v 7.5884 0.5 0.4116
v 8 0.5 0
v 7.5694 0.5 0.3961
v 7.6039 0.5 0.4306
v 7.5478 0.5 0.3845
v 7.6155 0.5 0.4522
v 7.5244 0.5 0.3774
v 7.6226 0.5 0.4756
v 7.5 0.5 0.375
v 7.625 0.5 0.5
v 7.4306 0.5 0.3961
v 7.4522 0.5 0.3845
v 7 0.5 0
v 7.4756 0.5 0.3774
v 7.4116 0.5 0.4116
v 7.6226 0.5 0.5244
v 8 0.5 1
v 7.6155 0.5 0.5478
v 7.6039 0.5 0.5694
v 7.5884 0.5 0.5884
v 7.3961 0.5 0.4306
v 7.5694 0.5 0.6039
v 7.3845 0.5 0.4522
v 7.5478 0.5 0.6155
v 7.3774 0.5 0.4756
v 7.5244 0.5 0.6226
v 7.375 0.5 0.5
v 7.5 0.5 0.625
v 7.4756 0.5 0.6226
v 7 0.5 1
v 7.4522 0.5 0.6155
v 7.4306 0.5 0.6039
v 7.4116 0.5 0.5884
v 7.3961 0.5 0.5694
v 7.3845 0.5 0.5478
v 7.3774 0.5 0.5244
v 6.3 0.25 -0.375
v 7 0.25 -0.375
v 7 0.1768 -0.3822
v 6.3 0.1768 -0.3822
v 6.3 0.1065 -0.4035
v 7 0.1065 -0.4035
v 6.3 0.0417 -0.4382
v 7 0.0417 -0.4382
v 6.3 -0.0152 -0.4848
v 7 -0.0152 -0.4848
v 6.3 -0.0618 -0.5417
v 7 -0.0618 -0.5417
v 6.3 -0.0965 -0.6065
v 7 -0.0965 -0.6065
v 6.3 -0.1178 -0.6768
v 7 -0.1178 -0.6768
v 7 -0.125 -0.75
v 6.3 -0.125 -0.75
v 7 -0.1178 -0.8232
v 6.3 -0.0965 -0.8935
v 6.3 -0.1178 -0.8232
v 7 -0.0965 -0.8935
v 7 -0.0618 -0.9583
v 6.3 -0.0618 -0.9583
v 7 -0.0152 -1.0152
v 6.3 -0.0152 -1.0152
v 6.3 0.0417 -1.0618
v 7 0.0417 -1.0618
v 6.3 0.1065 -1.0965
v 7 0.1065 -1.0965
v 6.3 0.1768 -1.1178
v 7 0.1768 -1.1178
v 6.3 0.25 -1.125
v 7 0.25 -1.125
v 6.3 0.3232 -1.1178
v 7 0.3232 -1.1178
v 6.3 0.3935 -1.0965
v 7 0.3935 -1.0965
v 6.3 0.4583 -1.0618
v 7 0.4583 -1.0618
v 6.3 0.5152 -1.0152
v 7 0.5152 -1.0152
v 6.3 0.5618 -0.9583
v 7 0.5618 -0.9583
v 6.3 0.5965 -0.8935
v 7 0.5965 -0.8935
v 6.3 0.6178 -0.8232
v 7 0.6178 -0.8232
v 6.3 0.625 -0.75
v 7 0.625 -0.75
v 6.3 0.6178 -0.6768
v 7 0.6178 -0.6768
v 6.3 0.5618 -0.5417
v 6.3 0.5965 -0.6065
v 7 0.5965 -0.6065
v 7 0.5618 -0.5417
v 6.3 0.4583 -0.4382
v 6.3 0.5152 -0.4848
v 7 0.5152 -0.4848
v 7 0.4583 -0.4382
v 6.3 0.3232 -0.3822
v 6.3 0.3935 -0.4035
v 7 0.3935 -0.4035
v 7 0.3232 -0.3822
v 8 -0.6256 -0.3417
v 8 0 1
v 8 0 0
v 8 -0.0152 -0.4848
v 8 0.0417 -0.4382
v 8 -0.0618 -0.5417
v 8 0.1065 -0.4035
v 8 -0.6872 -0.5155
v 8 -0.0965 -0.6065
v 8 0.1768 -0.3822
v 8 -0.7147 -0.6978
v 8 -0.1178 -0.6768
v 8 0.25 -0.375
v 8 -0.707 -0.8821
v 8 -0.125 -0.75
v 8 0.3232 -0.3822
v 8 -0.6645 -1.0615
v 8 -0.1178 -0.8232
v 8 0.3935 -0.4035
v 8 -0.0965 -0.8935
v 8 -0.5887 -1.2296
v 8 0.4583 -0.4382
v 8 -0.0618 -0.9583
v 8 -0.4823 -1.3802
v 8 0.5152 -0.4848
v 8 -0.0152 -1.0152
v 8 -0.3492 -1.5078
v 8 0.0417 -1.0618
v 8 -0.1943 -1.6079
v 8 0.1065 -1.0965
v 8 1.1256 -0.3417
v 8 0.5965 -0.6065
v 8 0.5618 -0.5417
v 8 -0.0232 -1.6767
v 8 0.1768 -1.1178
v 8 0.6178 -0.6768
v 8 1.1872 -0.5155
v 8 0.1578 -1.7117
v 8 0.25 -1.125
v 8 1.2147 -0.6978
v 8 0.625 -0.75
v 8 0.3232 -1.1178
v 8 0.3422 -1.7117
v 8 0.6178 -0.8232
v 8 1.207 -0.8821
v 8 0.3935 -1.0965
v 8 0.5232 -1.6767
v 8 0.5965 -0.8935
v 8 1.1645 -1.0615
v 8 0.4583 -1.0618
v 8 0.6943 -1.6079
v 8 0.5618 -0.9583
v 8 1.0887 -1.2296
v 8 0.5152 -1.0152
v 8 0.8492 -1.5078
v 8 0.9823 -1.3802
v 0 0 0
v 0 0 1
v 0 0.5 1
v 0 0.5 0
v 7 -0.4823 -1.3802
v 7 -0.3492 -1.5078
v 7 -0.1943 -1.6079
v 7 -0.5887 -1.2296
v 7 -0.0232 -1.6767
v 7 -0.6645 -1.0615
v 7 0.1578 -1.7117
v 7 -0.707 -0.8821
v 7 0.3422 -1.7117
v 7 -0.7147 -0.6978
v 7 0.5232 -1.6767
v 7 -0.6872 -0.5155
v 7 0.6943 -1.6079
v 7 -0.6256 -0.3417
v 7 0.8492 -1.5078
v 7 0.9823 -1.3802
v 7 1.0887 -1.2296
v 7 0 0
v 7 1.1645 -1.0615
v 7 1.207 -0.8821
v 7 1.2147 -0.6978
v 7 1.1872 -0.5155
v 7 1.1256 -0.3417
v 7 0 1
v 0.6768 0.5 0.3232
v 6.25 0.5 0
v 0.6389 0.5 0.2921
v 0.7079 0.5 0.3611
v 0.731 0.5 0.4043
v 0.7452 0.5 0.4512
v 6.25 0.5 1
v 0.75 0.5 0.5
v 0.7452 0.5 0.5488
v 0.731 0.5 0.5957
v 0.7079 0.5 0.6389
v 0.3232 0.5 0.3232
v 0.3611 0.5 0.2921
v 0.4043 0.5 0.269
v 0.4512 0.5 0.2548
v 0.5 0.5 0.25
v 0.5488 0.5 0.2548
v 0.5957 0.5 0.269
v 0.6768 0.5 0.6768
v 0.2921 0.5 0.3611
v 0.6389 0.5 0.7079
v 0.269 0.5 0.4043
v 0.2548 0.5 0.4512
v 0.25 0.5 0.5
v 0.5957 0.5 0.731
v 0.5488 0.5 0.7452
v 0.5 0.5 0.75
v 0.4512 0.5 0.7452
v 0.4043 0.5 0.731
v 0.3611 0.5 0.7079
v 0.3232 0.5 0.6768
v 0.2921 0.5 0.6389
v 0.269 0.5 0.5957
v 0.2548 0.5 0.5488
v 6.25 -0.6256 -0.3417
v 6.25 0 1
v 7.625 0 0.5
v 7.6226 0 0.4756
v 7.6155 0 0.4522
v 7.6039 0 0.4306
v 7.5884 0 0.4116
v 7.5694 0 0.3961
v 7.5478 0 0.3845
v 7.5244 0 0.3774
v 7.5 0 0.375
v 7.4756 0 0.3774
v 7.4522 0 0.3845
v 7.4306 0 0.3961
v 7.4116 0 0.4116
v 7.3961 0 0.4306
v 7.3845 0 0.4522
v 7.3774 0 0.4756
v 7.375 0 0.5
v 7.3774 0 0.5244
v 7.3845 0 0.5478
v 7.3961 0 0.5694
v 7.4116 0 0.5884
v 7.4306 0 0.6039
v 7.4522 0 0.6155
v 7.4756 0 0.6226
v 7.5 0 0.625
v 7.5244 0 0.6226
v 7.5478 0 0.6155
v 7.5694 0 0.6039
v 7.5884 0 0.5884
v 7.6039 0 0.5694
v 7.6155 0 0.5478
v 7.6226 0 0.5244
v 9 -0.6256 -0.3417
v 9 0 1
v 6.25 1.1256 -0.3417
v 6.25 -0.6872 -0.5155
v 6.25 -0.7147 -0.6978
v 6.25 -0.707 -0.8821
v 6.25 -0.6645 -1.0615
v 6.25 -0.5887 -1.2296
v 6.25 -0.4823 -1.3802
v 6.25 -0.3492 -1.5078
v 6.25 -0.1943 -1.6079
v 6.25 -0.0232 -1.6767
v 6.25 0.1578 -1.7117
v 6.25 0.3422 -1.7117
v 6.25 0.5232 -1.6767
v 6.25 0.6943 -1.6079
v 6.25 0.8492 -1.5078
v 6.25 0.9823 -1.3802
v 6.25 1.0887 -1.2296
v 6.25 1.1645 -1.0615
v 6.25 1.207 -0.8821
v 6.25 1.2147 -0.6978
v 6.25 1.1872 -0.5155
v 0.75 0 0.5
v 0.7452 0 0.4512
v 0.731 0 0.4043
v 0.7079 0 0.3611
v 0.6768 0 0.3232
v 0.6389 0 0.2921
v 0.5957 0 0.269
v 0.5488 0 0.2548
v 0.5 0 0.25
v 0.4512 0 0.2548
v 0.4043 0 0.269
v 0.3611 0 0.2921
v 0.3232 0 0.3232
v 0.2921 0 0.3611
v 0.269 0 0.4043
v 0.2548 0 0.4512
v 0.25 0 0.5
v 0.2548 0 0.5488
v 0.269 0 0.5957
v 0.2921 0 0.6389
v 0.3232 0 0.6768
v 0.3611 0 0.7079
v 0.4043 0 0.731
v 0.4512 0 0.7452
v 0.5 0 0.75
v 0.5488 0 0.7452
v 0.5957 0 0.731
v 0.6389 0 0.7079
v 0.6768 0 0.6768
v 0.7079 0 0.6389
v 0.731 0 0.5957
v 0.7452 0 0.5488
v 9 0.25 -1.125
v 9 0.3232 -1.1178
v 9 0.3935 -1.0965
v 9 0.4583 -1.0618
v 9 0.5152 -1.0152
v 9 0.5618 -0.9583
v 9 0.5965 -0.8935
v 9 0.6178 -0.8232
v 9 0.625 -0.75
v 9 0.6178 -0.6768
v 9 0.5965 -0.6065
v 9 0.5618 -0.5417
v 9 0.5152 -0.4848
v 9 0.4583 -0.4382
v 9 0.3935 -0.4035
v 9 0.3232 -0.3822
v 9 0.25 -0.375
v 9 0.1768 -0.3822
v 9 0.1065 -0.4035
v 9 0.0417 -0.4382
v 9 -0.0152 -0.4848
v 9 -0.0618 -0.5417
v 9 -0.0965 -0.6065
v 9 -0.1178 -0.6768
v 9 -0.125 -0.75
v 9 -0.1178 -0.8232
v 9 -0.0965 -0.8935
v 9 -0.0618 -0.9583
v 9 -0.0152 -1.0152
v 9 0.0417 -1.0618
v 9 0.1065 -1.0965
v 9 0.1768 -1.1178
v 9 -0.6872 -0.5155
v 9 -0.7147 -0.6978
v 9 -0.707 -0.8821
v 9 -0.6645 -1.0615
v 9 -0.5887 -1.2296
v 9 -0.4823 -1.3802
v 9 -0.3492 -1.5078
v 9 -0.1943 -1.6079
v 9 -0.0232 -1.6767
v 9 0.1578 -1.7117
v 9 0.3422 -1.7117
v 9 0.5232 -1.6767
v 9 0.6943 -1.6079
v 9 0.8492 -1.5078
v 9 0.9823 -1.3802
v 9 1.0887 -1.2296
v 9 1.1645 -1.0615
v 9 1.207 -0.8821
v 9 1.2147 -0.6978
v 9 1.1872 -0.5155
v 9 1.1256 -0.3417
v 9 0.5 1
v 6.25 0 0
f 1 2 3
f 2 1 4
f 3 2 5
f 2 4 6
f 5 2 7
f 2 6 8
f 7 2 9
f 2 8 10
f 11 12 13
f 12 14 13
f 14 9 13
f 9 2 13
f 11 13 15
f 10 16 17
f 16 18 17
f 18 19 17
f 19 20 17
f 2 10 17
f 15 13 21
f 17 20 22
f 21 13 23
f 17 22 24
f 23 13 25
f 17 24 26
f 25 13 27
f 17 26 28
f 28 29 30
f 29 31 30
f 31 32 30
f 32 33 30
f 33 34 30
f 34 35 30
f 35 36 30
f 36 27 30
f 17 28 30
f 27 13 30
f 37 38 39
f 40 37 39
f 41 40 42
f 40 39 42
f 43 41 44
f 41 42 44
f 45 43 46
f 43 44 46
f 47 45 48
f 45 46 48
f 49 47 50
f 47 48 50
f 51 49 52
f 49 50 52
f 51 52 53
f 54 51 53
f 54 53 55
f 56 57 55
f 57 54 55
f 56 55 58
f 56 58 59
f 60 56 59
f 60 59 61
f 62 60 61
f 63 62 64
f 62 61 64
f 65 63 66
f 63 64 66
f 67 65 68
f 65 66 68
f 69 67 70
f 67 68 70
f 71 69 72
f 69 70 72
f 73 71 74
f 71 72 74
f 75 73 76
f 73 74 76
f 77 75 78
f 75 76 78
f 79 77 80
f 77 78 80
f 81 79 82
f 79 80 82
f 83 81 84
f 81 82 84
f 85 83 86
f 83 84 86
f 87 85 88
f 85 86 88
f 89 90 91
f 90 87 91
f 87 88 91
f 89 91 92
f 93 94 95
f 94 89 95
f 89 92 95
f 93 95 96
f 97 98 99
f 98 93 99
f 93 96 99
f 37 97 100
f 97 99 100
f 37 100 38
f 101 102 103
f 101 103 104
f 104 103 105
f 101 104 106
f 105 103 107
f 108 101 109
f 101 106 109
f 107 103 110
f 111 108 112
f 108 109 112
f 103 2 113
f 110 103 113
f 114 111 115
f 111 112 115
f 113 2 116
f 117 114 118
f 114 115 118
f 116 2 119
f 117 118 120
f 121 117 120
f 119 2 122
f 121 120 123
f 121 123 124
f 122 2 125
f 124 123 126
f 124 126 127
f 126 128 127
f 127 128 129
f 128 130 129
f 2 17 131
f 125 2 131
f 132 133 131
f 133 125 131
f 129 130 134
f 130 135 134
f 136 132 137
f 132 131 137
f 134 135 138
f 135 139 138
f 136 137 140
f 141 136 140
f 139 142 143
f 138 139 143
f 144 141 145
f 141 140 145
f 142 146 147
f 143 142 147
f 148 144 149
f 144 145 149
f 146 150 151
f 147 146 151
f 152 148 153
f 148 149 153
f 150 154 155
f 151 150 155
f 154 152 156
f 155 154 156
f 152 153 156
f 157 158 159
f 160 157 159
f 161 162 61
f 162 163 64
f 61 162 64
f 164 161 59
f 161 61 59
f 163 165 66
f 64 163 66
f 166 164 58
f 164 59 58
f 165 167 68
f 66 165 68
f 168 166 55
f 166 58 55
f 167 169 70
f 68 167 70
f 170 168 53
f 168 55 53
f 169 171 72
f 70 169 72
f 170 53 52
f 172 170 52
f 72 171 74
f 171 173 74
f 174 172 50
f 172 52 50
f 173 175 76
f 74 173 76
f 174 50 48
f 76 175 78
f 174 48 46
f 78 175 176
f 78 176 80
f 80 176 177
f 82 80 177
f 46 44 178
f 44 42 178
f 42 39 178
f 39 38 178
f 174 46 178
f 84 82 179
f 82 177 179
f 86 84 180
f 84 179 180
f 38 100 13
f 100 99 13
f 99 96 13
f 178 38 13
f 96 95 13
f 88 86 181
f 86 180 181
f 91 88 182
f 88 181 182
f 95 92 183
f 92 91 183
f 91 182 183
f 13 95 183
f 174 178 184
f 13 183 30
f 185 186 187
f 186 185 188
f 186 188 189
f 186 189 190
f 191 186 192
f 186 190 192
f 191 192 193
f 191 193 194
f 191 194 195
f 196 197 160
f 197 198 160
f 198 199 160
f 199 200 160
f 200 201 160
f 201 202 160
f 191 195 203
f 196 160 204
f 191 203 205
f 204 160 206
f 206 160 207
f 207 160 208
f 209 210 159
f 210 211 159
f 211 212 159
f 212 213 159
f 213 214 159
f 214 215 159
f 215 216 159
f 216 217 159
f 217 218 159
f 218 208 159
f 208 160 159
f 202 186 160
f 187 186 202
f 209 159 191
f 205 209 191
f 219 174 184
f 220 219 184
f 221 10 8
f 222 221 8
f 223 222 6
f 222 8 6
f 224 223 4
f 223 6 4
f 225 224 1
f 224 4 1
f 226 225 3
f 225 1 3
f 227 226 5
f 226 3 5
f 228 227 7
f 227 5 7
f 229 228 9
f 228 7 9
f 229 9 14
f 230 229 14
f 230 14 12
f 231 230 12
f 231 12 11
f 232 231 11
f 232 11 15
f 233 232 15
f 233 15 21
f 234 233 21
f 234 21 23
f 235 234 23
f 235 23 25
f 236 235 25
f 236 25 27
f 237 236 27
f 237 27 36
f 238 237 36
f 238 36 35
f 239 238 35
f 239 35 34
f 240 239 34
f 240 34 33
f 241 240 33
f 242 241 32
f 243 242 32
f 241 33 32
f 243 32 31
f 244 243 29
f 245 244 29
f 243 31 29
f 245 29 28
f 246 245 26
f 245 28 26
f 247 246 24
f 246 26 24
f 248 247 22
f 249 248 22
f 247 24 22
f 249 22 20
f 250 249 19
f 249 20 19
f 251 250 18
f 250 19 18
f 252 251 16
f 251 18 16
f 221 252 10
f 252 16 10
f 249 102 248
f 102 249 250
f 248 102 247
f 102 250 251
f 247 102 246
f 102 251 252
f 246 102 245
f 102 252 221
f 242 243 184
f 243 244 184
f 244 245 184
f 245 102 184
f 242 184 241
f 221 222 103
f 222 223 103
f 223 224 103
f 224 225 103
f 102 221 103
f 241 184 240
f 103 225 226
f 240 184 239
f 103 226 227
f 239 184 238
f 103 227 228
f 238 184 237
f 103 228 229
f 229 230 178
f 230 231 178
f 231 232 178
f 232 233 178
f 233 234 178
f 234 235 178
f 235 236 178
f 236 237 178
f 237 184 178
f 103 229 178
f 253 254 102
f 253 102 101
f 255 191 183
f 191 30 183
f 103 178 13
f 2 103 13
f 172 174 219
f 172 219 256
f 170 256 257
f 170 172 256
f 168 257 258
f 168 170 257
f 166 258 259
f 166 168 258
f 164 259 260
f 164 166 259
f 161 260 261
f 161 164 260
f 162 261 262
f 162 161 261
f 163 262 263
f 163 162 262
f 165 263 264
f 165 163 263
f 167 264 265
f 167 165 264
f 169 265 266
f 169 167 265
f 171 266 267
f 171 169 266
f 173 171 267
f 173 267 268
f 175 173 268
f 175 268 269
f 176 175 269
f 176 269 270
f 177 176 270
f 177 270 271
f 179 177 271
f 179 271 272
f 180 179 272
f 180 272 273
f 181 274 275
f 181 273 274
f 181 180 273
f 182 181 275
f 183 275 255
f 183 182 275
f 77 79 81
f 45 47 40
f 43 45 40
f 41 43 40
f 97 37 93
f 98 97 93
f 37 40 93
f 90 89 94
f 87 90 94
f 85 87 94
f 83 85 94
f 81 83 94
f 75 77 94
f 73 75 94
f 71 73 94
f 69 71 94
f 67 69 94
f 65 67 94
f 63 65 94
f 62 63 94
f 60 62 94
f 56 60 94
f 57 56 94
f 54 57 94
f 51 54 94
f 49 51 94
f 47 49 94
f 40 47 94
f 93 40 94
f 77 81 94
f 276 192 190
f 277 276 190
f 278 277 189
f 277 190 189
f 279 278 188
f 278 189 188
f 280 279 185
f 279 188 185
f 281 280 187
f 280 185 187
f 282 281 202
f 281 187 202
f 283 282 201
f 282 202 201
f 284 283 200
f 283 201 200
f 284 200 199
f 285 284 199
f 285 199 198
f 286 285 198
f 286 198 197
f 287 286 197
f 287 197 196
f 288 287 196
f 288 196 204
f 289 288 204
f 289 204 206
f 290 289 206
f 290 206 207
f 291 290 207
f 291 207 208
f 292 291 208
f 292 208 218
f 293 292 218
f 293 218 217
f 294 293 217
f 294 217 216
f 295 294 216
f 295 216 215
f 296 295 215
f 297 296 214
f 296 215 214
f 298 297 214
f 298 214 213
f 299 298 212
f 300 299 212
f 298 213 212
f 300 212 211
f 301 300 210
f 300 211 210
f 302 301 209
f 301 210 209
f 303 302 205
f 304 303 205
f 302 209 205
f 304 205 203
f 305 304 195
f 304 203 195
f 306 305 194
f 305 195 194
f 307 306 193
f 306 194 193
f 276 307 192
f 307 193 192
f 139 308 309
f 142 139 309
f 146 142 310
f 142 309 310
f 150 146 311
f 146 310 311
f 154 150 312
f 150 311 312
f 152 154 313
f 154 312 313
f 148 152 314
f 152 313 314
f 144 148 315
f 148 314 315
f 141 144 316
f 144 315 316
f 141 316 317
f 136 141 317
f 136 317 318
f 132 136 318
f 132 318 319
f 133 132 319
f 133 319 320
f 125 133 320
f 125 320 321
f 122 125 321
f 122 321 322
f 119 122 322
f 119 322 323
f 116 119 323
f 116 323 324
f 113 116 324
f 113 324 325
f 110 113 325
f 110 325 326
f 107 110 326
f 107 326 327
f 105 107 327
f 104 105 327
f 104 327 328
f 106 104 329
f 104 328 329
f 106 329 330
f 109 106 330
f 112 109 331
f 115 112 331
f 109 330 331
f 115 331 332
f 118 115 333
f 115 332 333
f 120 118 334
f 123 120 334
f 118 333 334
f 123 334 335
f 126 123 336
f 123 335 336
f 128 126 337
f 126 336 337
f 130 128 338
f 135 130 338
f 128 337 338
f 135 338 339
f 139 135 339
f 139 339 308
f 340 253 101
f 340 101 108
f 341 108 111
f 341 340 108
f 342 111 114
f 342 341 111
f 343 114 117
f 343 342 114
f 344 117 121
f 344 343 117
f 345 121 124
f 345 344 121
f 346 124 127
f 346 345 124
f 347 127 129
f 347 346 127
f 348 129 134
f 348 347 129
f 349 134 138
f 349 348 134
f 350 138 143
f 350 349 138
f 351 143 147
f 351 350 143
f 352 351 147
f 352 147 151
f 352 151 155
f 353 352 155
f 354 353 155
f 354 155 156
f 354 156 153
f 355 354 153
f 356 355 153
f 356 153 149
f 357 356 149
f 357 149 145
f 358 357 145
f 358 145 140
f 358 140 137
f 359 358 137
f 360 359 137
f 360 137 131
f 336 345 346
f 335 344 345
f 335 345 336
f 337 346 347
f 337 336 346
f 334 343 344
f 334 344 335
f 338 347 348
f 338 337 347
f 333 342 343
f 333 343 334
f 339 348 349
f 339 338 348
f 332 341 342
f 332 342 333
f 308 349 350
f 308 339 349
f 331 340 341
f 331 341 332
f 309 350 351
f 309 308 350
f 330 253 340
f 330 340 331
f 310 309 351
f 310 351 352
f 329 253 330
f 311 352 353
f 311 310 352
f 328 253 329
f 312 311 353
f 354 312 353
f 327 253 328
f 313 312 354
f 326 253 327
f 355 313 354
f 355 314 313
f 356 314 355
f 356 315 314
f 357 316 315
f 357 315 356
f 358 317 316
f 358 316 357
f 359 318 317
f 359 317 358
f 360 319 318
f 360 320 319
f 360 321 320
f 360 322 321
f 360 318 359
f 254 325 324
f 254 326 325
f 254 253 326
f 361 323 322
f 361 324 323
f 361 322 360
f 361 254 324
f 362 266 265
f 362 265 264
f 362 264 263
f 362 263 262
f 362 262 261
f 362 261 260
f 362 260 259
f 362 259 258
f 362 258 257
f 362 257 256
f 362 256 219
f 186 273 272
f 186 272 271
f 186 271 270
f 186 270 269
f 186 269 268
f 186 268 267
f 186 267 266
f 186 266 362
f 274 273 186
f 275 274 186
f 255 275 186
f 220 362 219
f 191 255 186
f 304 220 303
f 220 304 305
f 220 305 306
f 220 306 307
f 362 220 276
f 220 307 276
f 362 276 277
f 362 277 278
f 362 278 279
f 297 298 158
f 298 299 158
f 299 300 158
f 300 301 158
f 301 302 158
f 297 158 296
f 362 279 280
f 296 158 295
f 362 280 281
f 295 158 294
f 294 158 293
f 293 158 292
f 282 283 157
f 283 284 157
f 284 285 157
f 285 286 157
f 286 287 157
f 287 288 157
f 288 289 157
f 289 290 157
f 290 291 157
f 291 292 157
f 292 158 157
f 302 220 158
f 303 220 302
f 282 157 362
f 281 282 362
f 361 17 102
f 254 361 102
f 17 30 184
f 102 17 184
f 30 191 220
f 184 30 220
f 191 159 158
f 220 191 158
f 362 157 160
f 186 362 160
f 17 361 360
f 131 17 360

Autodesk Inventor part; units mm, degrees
ref_plane "YZ Plane" through (0, 0, 0) normal (1, 0, 0) x (0, 1, 0)
ref_plane "XZ Plane" through (0, 0, 0) normal (0, 1, 0) x (-1, 0, 0)
sketch "Sketch1" plane through (0, 0, 0) normal (0, 1, 0) x (-1, 0, 0)
  point P0 (0, 0)
sketch "Sketch2" plane through (0, 0, 0) normal (1, 0, 0) x (0, 1, 0)
  point P0 (0, 0)
sketch "Sketch3" plane through (0, 0, 0) normal (1, 0, 0) x (0, 1, 0)
  line L0 (0, 0) -> (0.5, 0)
  line L1 (0.5, 0) -> (0.5, 1)
  line L2 (0.5, 1) -> (0, 1)
  line L3 (0, 1) -> (0, 0)
  dimension "d0" = 0.5
  dimension "d1" = 1
extrude "Extrusion1" add sketch "Sketch3" along normal blind 9
sketch "Sketch4" plane through (9, 0, 0) normal (1, 0, 0) x (0, 0, -1)
  line L0 (0, 0) -> (0, 0.5) projected
  circle A0 centre (0.75, 0.25) radius 0.375
  line L1 (0, 0.5) -> (-1, 0.5) projected
  line L2 (-1, 0.5) -> (-1, 0) construction
  line L3 (-1, 0.25) -> (1.9779, 0.25) construction
  line L4 (0, 0) -> (0, 0.5) projected
  line L5 (0, 0.5) -> (-1, 0.5) projected
  line L6 (-1, 0.5) -> (-1, 0) projected
  line L7 (-1, 0) -> (0, 0) projected
  line L8 (-1, 0) -> (0, 0) projected
  line L9 (-1, 0.5) -> (0.3417, 1.1256)
  line L10 (-1, 0) -> (0.3417, -0.6256)
  arc A1 (0.3417, -0.6256) -> (0.3417, 1.1256) centre (0.75, 0.25) ccw
  point P0 (-0.5, 0)
  dimension "d9" = 0.75
  dimension "d12" = 1.25
  dimension "d13" = 0
  dimension "d14" = 25
extrude "Extrusion2" add sketch "Sketch4" against normal blind 1 contours L0 L1 L9 A1 L10 L7
ref_plane "Work Plane1" through (7, 0, 0) normal (-1, 0, 0) x (0, 0, 1)
sketch "Sketch5" plane through (7, 0, 0) normal (-1, 0, 0) x (0, 0, 1)
  line L0 (-0.3417, -0.6256) -> (1, 0) projected
  line L1 (0, 0) -> (1, 0) projected
  line L2 (0, 0.5) -> (0, 0) projected
  line L3 (1, 0.5) -> (0, 0.5) projected
  line L4 (1, 0.5) -> (-0.3417, 1.1256) projected
  arc A0 (-0.3417, 1.1256) -> (-0.3417, -0.6256) centre (-0.75, 0.25) ccw projected
  circle A1 centre (-0.75, 0.25) radius 0.375 projected
extrude "Extrusion3" add sketch "Sketch5" along normal blind 0.75
sketch "Sketch6" plane through (6.25, 0, 0) normal (-1, 0, 0) x (0, 0, 1)
  circle A0 centre (-0.75, 0.25) radius 0.375 projected
  point P0 (0, 0)
extrude "Extrusion4" add sketch "Sketch6" against normal blind 0.05
sketch "Sketch7" plane through (0, 0.5, 1) normal (0, 1, 0) x (1, 0, 0)
  line L0 (8, 2.6833) -> (9, 2.6833) projected
  line L1 (9, 2.6833) -> (9, 2.0295) projected
  line L2 (9, 2.0295) -> (8, 2.0295) projected
  line L3 (8, 2.0295) -> (8, 2.6833) projected
  line L4 (9, 0) -> (8, 0) projected
  line L5 (8, 0) -> (8, 1) projected
  line L6 (8, 1) -> (8, 1.4705) projected
  line L7 (8, 1.4705) -> (9, 1.4705) projected
  line L8 (9, 1.4705) -> (9, 0) projected
  line L9 (8, 0) -> (7, 0) projected
  line L10 (7, 1) -> (7, 0) projected
  line L11 (7, 1.4705) -> (7, 1) projected
  line L12 (6.3, 1.4705) -> (7, 1.4705) projected
  line L13 (6.3, 2.0295) -> (6.3, 1.4705) projected
  line L14 (7, 2.0295) -> (6.3, 2.0295) projected
  line L15 (7, 2.6833) -> (7, 2.0295) projected
  line L16 (6.25, 2.6833) -> (7, 2.6833) projected
  line L17 (6.25, 1) -> (6.25, 2.6833) projected
  line L18 (0, 1) -> (6.25, 1) projected
  line L19 (0, 0) -> (0, 1) projected
  line L20 (6.25, 0) -> (0, 0) projected
  line L21 (7, 0) -> (6.25, 0) projected
  line L22 (7, 1) -> (8, 1) projected
  line L23 (6.25, 0) -> (6.25, 1) projected
  circle A0 centre (7.5, 0.5) radius 0.5
  line L24 (7, 0) -> (8, 0) projected
  line L25 (7, 0) -> (7, 1.3417) projected
  line L26 (7, 1) -> (8, 1) projected
  line L27 (8, 0) -> (8, 1.3417) projected
  circle A1 centre (7.5, 0.5) radius 0.125
  line L28 (7, 0) -> (7.4116, 0.4116)
  line L29 (7.5884, 0.5884) -> (8, 1)
  line L30 (7, 1) -> (7.4116, 0.5884)
  line L31 (7.5884, 0.4116) -> (8, 0)
  dimension "d22" = 0.25
extrude "Extrusion5" cut sketch "Sketch7" against normal through all contours A1
sketch "Sketch8" plane through (0, 0.5, 1) normal (0, 1, 0) x (1, 0, 0)
  line L0 (0, 1) -> (6.25, 1) projected
  line L1 (0, 0) -> (1, 0)
  line L2 (1, 0) -> (1, 1)
  line L3 (1, 1) -> (0, 1)
  line L4 (0, 1) -> (0, 0)
  line L5 (0, 1) -> (0, 0) projected
  circle A0 centre (0.5, 0.5) radius 0.25
  line L6 (0, 0) -> (0.3232, 0.3232)
  line L7 (0.6768, 0.6768) -> (1, 1)
  line L8 (0, 1) -> (0.3232, 0.6768)
  line L9 (0.6768, 0.3232) -> (1, 0)
  dimension "d25" = 1
  dimension "d26" = 0.5
extrude "Extrusion6" cut sketch "Sketch8" against normal through all contours A0
properties part number "rocker"
